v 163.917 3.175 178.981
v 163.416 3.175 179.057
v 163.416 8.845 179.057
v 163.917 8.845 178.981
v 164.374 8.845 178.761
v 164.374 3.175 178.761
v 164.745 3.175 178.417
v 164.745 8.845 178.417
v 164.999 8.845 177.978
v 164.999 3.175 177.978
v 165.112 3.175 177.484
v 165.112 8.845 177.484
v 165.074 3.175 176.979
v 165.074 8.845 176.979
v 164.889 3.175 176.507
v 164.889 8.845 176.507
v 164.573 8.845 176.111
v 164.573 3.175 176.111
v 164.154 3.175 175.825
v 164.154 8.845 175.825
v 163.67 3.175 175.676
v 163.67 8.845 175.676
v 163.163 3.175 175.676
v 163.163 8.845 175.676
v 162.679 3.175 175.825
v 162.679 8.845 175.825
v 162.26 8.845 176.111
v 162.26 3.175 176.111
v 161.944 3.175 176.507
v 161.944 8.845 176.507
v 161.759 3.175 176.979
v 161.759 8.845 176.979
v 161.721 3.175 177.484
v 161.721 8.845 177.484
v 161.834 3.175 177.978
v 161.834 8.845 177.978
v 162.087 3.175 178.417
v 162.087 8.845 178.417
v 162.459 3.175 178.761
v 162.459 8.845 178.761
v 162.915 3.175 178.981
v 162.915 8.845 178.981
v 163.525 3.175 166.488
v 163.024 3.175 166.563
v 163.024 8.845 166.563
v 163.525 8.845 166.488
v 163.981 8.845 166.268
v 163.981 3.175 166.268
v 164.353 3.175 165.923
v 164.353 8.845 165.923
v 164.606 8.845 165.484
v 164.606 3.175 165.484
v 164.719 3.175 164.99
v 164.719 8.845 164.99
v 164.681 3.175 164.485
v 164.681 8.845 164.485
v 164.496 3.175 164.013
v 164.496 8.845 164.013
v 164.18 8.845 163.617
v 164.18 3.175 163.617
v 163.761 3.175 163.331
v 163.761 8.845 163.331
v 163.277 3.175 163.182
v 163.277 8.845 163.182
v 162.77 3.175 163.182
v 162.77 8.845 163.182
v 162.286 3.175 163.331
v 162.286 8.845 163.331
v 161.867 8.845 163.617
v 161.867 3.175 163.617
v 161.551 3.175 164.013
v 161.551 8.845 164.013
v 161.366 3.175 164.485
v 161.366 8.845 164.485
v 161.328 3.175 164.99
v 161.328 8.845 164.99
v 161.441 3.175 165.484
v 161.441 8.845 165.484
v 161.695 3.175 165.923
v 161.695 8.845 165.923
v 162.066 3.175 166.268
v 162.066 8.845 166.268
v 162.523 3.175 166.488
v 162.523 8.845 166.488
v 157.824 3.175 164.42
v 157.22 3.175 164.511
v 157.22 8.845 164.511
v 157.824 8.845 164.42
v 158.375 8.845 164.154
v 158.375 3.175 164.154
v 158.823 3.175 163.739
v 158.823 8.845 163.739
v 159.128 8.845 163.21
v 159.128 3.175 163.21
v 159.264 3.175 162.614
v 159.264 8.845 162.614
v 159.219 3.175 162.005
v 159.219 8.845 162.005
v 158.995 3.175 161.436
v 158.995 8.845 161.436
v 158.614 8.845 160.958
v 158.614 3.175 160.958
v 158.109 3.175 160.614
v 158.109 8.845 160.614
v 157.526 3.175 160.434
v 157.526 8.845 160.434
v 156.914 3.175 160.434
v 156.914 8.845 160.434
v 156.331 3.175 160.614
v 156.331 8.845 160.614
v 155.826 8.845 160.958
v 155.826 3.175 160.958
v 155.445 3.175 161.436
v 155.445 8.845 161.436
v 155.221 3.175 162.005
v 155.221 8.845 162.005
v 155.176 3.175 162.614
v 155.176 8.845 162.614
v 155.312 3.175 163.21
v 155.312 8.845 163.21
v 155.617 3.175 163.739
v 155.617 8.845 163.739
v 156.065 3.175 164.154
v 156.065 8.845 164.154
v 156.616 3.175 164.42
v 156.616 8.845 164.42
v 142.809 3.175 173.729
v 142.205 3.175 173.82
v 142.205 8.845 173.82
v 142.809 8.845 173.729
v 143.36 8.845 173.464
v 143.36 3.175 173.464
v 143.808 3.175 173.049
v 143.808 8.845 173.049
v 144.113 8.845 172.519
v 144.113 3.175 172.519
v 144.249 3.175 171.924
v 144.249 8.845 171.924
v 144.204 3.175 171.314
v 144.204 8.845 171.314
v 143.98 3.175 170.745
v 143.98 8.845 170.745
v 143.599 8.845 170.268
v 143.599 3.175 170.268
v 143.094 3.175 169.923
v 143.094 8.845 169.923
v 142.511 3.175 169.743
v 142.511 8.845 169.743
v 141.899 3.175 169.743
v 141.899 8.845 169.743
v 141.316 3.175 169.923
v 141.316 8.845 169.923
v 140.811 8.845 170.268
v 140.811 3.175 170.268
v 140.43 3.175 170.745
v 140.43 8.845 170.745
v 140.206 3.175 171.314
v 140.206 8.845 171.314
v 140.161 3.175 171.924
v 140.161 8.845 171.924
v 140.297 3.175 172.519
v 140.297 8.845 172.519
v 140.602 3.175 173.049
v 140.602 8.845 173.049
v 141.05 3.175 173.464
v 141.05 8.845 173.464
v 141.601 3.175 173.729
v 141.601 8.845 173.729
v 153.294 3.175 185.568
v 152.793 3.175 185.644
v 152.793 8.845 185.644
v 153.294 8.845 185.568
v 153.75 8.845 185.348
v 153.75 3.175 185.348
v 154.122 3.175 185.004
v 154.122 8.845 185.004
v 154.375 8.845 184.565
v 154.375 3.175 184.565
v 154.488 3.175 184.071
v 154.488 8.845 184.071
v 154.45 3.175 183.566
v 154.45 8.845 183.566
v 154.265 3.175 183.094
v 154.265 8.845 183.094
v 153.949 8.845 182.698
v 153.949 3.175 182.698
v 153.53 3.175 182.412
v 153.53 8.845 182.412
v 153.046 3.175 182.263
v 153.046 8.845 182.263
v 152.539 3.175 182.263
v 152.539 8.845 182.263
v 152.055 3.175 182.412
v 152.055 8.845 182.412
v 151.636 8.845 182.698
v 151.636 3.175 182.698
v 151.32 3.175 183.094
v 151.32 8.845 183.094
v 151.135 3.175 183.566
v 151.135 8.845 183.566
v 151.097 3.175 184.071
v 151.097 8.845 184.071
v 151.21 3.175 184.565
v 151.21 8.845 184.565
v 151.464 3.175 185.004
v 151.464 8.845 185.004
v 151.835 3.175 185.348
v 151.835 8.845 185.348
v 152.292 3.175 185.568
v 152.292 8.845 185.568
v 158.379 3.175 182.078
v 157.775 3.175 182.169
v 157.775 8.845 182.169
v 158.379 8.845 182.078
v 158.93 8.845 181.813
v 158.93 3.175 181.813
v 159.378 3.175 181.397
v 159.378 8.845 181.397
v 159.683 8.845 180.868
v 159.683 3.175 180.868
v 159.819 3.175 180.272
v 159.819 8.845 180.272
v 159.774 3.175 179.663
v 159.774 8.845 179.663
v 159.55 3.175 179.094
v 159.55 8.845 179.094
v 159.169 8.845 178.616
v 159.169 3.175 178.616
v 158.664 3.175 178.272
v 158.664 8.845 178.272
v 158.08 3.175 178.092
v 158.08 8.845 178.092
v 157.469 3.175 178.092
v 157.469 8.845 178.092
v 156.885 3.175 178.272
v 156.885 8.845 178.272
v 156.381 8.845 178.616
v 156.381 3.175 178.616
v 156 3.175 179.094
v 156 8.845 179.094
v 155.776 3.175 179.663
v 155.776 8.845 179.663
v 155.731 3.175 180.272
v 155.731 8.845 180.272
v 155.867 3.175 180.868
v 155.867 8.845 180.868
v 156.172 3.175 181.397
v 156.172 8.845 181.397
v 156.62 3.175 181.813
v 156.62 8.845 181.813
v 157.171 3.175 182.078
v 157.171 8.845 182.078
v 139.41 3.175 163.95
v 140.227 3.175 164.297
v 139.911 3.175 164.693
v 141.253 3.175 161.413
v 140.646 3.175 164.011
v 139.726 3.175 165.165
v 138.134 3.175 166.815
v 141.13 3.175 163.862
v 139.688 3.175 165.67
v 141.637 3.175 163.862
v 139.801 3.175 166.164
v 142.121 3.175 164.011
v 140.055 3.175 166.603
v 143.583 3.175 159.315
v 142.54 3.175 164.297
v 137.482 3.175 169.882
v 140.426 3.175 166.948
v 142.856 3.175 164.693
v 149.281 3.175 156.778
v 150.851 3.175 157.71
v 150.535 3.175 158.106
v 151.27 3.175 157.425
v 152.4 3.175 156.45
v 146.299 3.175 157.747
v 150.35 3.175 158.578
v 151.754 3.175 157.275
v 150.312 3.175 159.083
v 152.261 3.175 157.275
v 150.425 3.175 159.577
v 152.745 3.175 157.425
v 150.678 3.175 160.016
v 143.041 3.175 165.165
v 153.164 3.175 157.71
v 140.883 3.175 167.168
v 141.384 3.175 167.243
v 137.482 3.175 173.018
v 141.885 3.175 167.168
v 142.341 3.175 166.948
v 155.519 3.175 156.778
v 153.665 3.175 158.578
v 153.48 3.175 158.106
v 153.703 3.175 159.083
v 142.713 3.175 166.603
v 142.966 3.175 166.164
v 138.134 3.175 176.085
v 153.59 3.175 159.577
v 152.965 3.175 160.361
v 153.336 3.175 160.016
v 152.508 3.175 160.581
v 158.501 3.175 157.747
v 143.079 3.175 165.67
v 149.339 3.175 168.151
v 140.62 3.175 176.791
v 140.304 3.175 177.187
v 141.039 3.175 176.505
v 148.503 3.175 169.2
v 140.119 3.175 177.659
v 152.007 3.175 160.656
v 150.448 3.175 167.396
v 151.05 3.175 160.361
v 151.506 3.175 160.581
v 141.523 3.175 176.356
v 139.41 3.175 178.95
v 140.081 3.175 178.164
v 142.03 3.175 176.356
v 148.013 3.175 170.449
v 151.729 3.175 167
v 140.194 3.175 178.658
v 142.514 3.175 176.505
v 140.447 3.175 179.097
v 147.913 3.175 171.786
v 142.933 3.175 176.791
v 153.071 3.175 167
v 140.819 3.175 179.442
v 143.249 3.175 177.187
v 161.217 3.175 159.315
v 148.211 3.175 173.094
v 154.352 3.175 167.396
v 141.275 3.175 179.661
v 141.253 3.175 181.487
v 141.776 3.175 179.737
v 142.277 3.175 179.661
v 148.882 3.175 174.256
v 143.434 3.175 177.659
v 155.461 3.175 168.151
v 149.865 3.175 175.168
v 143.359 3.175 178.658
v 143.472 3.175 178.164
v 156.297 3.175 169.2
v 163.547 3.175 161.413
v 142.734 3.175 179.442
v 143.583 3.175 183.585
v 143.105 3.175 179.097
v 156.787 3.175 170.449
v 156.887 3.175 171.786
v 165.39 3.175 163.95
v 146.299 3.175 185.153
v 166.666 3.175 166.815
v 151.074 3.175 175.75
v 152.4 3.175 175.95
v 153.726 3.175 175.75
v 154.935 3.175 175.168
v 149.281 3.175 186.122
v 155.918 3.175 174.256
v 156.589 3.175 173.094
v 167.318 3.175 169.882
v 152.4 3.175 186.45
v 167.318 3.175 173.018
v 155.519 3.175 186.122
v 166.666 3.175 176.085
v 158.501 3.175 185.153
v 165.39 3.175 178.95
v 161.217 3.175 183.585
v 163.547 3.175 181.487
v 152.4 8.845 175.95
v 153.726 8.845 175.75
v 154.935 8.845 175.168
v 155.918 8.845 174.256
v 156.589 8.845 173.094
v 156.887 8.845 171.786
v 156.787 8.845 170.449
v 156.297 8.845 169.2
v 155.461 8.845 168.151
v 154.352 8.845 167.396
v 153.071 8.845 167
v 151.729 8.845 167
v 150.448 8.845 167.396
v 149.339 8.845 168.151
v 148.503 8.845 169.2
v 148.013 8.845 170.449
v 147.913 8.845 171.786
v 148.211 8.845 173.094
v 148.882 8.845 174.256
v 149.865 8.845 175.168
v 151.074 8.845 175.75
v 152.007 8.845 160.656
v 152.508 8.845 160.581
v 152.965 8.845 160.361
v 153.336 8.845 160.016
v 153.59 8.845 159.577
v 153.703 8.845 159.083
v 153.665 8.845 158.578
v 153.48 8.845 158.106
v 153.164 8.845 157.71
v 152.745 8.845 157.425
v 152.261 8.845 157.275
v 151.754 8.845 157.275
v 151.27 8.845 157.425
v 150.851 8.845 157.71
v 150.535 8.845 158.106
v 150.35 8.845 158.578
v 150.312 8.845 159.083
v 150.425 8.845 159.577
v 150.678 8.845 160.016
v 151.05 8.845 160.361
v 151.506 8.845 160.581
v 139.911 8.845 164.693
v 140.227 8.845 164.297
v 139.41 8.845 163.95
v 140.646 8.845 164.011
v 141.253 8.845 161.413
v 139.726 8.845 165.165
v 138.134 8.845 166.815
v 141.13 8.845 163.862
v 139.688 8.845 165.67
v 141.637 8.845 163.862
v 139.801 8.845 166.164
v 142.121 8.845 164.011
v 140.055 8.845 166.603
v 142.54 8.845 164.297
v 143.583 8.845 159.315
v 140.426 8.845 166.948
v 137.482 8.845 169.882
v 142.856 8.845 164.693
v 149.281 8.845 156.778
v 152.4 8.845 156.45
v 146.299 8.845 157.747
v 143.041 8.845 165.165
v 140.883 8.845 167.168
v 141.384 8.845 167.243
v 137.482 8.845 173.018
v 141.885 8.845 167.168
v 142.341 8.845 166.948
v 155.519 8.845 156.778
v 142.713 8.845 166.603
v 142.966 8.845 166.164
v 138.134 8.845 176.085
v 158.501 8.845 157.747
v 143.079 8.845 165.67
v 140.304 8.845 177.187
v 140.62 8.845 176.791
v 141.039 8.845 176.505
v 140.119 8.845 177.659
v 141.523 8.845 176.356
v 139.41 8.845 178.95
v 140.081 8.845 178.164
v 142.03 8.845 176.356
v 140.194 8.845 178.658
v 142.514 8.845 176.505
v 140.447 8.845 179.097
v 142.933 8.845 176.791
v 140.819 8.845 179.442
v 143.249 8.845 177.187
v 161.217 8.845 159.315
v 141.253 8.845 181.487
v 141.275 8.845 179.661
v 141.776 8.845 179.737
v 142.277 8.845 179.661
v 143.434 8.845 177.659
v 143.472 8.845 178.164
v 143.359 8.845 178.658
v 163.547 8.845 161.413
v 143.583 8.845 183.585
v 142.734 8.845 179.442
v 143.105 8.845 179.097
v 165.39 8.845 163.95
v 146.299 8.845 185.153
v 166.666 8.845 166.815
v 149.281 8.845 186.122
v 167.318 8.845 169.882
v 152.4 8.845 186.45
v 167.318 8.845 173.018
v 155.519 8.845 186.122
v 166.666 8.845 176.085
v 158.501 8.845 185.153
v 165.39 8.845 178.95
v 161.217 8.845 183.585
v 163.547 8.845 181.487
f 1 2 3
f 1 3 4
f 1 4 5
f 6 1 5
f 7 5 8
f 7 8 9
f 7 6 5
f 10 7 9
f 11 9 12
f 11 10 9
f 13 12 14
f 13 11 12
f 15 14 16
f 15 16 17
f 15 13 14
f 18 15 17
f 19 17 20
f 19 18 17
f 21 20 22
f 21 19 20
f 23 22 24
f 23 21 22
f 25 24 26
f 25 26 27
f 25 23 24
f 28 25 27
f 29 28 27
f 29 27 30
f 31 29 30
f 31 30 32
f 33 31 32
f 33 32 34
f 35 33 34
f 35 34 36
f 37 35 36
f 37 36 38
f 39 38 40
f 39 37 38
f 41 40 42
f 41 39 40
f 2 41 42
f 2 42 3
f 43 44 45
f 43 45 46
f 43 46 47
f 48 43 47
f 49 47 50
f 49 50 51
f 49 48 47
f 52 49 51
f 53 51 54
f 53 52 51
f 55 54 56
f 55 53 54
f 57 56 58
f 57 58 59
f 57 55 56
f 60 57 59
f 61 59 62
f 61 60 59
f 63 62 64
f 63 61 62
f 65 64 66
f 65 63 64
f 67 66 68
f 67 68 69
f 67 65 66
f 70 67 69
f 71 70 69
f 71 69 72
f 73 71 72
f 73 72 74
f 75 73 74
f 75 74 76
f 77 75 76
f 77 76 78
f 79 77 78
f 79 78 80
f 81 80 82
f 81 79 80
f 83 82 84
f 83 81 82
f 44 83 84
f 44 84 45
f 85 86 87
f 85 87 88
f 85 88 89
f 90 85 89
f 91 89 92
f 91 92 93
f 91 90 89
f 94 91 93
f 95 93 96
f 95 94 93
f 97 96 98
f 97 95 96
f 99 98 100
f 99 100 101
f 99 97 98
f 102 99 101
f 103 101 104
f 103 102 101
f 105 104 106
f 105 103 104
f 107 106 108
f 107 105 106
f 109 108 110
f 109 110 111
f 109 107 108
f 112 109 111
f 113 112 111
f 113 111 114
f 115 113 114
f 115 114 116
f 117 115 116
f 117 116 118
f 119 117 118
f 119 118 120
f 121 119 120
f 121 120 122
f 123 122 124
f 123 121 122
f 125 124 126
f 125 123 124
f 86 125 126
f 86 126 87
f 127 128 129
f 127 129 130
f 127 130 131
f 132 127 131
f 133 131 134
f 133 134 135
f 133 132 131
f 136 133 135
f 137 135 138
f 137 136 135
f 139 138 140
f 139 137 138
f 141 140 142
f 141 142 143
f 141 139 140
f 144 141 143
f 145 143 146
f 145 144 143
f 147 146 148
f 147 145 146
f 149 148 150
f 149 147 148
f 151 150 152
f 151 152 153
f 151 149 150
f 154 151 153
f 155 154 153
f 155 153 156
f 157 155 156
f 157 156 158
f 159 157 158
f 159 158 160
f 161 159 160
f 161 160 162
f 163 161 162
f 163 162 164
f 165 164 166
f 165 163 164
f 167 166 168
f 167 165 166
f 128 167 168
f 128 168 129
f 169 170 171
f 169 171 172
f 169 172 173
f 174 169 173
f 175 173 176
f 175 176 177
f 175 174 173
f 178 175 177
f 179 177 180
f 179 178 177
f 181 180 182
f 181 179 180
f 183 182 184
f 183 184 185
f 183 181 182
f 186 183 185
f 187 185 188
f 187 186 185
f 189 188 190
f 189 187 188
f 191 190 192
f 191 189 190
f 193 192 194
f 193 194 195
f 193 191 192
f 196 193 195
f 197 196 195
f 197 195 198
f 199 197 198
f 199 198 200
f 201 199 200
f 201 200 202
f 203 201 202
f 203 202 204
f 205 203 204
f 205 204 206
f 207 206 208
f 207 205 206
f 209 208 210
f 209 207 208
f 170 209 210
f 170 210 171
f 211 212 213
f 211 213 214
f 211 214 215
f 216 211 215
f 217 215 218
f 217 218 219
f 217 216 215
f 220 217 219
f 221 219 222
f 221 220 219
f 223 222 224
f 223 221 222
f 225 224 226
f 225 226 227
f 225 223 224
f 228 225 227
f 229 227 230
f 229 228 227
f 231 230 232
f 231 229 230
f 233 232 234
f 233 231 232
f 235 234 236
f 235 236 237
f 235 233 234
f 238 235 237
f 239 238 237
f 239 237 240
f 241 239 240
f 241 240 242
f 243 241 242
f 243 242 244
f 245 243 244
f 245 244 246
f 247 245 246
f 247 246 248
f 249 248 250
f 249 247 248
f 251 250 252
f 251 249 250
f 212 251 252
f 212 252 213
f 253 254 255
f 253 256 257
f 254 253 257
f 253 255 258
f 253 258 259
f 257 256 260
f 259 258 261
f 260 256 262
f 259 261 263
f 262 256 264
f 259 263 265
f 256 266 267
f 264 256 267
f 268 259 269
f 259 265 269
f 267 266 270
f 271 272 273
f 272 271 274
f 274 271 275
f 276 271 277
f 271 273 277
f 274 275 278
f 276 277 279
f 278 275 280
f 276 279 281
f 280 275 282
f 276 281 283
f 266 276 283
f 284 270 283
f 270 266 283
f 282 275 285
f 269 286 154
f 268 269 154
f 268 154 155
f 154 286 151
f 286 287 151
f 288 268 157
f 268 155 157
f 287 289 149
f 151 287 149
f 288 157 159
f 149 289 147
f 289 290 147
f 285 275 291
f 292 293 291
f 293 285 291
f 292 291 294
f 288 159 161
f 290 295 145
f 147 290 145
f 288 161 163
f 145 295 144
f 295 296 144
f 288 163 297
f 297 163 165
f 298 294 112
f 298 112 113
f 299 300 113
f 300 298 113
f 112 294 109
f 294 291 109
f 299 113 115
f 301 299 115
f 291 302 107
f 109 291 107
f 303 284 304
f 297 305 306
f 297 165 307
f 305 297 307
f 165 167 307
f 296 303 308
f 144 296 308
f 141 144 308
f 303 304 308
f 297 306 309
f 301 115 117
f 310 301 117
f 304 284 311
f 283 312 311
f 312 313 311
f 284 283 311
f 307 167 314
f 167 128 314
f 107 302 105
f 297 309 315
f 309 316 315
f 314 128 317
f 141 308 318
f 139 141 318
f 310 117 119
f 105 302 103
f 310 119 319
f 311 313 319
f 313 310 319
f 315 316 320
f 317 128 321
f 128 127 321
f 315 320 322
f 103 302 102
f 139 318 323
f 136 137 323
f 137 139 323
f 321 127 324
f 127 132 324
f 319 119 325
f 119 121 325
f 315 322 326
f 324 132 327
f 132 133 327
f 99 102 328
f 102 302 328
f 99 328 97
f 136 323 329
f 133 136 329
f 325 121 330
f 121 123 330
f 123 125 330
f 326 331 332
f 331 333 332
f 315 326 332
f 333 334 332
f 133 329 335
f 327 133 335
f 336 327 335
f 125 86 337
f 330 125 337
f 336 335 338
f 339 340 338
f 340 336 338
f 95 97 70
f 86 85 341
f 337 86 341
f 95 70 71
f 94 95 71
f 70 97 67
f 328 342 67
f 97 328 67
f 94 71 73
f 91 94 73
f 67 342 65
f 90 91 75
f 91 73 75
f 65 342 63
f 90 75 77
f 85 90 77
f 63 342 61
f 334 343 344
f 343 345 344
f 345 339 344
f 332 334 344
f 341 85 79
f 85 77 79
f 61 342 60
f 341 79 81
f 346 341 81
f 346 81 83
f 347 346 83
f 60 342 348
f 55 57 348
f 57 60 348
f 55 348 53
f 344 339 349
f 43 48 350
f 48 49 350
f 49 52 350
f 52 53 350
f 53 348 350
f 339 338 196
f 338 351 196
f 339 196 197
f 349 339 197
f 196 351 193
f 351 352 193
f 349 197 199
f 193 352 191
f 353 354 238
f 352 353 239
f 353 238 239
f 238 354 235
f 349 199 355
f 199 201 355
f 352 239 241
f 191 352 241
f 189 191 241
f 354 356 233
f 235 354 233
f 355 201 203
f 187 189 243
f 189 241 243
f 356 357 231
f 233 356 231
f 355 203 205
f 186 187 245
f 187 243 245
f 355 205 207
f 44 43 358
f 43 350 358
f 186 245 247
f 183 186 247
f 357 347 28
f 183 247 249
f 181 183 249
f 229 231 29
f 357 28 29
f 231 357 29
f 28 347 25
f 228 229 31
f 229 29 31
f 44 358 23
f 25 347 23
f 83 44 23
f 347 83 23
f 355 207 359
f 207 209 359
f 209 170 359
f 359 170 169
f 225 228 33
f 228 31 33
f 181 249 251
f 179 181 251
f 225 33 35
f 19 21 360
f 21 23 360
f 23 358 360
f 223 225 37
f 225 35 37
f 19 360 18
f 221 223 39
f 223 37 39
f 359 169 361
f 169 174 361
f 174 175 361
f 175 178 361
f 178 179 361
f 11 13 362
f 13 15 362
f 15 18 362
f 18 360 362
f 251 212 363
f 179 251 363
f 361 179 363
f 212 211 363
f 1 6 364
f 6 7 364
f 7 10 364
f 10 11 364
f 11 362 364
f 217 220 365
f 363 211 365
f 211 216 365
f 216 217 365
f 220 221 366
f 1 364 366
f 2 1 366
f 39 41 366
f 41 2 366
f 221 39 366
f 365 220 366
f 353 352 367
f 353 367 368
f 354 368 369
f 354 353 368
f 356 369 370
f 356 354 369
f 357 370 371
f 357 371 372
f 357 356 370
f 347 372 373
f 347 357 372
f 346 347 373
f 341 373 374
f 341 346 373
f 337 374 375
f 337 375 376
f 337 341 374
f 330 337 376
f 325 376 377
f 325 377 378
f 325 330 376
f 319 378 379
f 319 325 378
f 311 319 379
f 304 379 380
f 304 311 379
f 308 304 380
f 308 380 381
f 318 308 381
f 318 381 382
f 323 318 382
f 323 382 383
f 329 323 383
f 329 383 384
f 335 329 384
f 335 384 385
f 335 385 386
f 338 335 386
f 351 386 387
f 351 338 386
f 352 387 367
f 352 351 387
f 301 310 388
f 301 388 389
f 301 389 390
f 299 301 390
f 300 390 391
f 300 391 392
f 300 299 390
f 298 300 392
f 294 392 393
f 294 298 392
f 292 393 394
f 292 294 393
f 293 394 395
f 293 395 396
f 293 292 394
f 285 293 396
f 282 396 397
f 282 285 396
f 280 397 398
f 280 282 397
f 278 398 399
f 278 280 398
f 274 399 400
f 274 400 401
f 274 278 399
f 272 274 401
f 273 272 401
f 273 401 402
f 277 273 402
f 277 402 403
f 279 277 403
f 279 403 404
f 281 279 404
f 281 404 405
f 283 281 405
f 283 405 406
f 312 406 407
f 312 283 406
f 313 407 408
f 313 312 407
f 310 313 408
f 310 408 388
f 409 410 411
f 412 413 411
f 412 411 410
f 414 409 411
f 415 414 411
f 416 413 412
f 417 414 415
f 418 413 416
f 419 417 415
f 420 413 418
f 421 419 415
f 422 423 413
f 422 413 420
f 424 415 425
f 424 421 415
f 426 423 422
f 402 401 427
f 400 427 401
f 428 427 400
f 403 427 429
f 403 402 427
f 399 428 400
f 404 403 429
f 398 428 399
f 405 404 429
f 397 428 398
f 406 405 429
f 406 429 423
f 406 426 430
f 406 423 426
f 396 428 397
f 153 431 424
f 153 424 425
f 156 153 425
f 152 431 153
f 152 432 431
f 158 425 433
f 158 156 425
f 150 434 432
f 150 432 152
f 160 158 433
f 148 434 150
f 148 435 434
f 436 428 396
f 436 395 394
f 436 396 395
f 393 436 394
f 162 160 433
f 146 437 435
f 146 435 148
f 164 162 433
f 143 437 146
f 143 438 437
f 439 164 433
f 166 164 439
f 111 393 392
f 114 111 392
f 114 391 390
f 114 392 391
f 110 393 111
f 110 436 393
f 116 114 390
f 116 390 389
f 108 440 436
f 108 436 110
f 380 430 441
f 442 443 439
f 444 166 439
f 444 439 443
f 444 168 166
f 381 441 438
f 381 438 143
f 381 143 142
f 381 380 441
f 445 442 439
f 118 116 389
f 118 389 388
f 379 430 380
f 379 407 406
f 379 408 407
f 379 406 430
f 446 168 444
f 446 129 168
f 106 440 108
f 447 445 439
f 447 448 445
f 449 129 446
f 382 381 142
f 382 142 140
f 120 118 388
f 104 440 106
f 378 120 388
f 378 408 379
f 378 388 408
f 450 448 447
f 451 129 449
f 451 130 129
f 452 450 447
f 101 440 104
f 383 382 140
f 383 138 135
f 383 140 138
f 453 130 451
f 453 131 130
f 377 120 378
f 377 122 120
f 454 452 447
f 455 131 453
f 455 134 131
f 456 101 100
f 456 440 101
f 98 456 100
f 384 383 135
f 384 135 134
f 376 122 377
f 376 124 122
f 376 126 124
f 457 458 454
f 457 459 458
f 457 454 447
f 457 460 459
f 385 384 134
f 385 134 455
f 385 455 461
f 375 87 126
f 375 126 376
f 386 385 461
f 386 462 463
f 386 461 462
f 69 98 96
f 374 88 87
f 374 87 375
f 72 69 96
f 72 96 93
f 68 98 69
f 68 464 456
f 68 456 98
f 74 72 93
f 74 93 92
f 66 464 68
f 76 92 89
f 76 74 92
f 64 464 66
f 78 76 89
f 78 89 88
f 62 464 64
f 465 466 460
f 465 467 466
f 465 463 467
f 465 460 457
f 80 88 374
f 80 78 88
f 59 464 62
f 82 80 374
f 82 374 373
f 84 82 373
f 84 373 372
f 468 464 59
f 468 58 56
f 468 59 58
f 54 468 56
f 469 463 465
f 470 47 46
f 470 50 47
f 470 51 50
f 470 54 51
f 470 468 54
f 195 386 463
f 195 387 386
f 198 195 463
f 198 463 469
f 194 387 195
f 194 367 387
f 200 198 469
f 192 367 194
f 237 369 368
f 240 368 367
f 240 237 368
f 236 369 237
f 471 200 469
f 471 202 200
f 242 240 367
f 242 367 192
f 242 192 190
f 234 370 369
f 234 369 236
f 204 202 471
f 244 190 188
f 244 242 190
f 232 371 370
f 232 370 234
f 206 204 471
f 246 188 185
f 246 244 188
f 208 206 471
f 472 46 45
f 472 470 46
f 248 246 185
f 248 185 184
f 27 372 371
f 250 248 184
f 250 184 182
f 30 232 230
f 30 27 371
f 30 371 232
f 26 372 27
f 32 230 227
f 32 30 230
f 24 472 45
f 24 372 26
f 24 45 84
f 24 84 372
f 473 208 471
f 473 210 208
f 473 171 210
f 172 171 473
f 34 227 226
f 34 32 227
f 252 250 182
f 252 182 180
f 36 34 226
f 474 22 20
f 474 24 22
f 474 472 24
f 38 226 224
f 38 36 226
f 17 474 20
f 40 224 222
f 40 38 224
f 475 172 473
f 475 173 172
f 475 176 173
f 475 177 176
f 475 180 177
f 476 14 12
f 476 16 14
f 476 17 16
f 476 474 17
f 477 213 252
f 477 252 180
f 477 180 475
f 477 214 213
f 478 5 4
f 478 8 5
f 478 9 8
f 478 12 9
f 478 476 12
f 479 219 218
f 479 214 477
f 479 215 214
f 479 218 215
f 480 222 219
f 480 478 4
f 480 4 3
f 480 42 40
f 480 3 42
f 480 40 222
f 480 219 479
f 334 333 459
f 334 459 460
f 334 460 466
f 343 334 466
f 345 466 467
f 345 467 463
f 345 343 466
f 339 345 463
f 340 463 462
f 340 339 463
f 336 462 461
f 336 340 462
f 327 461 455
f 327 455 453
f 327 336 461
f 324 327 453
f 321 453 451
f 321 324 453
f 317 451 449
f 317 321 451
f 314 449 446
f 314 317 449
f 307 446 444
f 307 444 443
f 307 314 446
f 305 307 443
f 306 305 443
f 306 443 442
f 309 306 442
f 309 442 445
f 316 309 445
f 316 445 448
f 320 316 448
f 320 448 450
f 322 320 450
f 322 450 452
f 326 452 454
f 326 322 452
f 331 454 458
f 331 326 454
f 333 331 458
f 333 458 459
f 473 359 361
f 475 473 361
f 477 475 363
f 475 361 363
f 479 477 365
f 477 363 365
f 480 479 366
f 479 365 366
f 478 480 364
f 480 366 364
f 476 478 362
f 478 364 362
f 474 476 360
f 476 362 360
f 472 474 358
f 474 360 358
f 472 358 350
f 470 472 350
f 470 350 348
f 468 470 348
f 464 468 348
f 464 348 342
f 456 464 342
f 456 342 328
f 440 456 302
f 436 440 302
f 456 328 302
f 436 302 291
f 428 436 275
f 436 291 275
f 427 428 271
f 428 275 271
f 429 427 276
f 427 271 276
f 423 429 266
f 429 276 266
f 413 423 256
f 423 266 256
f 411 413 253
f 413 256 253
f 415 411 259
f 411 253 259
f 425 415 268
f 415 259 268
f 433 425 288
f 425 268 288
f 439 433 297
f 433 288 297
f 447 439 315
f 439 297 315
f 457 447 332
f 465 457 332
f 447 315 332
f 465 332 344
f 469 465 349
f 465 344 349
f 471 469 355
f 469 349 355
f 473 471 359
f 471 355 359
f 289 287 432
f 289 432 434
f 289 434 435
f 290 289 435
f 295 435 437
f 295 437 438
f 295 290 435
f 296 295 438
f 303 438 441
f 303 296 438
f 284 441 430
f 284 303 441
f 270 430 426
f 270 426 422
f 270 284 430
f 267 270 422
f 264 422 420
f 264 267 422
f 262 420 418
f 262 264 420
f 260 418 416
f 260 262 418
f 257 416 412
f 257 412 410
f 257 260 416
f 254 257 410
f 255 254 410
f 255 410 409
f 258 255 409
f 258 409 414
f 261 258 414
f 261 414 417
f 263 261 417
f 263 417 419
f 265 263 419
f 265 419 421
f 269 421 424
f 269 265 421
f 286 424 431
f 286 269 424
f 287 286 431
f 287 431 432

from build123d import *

# Parameters (mm, degrees)
DISCO_START    = 3.175
CROQUIS5_R     = 15
DISCO_DEPTH    = 5.67
BARRENOS_START = 3.175
CROQUIS6_R     = 1.7
CROQUIS6_R_2   = 2.05
CROQUIS6_R_3   = 4.5
BARRENOS_DEPTH = 5.67


with BuildPart() as part:
    # Croquis5 → Disco (new body)
    with BuildSketch(Plane(origin=(0, 0, 0), x_dir=(1, 0, 0), z_dir=(0, 1, 0)).offset(DISCO_START)):
        with Locations(Location((152.4, -171.45, 0), (0, 0, 270))):
            Circle(CROQUIS5_R)
    extrude(amount=DISCO_DEPTH)

    # Croquis6 → Barrenos (cut)
    with BuildSketch(Plane(origin=(0, 0, 0), x_dir=(1, 0, 0), z_dir=(0, 1, 0)).offset(BARRENOS_START)):
        with Locations(Location((163.416293151, -177.356884561, 0), (0, 0, 270))):
            Circle(CROQUIS6_R)
        with Locations(Location((152.792634488, -183.943832005, 0), (0, 0, 270))):
            Circle(CROQUIS6_R)
        with Locations(Location((141.776341338, -178.036947444, 0), (0, 0, 270))):
            Circle(CROQUIS6_R)
        with Locations(Location((141.383706849, -165.543115439, 0), (0, 0, 270))):
            Circle(CROQUIS6_R)
        with Locations(Location((152.007365512, -158.956167995, 0), (0, 0, 270))):
            Circle(CROQUIS6_R)
        with Locations(Location((163.023658662, -164.863052556, 0), (0, 0, 270))):
            Circle(CROQUIS6_R)
        with Locations(Location((157.774949114, -180.118905468, 0), (0, 0, 270))):
            Circle(CROQUIS6_R_2)
        with Locations(Location((142.205033084, -171.770389743, 0), (0, 0, 270))):
            Circle(CROQUIS6_R_2)
        with Locations(Location((157.220017802, -162.460704789, 0), (0, 0, 270))):
            Circle(CROQUIS6_R_2)
        with Locations(Location((152.4, -171.45, 0), (0, 0, 270))):
            Circle(CROQUIS6_R_3)
    extrude(amount=BARRENOS_DEPTH, mode=Mode.SUBTRACT)


solid = part.part
